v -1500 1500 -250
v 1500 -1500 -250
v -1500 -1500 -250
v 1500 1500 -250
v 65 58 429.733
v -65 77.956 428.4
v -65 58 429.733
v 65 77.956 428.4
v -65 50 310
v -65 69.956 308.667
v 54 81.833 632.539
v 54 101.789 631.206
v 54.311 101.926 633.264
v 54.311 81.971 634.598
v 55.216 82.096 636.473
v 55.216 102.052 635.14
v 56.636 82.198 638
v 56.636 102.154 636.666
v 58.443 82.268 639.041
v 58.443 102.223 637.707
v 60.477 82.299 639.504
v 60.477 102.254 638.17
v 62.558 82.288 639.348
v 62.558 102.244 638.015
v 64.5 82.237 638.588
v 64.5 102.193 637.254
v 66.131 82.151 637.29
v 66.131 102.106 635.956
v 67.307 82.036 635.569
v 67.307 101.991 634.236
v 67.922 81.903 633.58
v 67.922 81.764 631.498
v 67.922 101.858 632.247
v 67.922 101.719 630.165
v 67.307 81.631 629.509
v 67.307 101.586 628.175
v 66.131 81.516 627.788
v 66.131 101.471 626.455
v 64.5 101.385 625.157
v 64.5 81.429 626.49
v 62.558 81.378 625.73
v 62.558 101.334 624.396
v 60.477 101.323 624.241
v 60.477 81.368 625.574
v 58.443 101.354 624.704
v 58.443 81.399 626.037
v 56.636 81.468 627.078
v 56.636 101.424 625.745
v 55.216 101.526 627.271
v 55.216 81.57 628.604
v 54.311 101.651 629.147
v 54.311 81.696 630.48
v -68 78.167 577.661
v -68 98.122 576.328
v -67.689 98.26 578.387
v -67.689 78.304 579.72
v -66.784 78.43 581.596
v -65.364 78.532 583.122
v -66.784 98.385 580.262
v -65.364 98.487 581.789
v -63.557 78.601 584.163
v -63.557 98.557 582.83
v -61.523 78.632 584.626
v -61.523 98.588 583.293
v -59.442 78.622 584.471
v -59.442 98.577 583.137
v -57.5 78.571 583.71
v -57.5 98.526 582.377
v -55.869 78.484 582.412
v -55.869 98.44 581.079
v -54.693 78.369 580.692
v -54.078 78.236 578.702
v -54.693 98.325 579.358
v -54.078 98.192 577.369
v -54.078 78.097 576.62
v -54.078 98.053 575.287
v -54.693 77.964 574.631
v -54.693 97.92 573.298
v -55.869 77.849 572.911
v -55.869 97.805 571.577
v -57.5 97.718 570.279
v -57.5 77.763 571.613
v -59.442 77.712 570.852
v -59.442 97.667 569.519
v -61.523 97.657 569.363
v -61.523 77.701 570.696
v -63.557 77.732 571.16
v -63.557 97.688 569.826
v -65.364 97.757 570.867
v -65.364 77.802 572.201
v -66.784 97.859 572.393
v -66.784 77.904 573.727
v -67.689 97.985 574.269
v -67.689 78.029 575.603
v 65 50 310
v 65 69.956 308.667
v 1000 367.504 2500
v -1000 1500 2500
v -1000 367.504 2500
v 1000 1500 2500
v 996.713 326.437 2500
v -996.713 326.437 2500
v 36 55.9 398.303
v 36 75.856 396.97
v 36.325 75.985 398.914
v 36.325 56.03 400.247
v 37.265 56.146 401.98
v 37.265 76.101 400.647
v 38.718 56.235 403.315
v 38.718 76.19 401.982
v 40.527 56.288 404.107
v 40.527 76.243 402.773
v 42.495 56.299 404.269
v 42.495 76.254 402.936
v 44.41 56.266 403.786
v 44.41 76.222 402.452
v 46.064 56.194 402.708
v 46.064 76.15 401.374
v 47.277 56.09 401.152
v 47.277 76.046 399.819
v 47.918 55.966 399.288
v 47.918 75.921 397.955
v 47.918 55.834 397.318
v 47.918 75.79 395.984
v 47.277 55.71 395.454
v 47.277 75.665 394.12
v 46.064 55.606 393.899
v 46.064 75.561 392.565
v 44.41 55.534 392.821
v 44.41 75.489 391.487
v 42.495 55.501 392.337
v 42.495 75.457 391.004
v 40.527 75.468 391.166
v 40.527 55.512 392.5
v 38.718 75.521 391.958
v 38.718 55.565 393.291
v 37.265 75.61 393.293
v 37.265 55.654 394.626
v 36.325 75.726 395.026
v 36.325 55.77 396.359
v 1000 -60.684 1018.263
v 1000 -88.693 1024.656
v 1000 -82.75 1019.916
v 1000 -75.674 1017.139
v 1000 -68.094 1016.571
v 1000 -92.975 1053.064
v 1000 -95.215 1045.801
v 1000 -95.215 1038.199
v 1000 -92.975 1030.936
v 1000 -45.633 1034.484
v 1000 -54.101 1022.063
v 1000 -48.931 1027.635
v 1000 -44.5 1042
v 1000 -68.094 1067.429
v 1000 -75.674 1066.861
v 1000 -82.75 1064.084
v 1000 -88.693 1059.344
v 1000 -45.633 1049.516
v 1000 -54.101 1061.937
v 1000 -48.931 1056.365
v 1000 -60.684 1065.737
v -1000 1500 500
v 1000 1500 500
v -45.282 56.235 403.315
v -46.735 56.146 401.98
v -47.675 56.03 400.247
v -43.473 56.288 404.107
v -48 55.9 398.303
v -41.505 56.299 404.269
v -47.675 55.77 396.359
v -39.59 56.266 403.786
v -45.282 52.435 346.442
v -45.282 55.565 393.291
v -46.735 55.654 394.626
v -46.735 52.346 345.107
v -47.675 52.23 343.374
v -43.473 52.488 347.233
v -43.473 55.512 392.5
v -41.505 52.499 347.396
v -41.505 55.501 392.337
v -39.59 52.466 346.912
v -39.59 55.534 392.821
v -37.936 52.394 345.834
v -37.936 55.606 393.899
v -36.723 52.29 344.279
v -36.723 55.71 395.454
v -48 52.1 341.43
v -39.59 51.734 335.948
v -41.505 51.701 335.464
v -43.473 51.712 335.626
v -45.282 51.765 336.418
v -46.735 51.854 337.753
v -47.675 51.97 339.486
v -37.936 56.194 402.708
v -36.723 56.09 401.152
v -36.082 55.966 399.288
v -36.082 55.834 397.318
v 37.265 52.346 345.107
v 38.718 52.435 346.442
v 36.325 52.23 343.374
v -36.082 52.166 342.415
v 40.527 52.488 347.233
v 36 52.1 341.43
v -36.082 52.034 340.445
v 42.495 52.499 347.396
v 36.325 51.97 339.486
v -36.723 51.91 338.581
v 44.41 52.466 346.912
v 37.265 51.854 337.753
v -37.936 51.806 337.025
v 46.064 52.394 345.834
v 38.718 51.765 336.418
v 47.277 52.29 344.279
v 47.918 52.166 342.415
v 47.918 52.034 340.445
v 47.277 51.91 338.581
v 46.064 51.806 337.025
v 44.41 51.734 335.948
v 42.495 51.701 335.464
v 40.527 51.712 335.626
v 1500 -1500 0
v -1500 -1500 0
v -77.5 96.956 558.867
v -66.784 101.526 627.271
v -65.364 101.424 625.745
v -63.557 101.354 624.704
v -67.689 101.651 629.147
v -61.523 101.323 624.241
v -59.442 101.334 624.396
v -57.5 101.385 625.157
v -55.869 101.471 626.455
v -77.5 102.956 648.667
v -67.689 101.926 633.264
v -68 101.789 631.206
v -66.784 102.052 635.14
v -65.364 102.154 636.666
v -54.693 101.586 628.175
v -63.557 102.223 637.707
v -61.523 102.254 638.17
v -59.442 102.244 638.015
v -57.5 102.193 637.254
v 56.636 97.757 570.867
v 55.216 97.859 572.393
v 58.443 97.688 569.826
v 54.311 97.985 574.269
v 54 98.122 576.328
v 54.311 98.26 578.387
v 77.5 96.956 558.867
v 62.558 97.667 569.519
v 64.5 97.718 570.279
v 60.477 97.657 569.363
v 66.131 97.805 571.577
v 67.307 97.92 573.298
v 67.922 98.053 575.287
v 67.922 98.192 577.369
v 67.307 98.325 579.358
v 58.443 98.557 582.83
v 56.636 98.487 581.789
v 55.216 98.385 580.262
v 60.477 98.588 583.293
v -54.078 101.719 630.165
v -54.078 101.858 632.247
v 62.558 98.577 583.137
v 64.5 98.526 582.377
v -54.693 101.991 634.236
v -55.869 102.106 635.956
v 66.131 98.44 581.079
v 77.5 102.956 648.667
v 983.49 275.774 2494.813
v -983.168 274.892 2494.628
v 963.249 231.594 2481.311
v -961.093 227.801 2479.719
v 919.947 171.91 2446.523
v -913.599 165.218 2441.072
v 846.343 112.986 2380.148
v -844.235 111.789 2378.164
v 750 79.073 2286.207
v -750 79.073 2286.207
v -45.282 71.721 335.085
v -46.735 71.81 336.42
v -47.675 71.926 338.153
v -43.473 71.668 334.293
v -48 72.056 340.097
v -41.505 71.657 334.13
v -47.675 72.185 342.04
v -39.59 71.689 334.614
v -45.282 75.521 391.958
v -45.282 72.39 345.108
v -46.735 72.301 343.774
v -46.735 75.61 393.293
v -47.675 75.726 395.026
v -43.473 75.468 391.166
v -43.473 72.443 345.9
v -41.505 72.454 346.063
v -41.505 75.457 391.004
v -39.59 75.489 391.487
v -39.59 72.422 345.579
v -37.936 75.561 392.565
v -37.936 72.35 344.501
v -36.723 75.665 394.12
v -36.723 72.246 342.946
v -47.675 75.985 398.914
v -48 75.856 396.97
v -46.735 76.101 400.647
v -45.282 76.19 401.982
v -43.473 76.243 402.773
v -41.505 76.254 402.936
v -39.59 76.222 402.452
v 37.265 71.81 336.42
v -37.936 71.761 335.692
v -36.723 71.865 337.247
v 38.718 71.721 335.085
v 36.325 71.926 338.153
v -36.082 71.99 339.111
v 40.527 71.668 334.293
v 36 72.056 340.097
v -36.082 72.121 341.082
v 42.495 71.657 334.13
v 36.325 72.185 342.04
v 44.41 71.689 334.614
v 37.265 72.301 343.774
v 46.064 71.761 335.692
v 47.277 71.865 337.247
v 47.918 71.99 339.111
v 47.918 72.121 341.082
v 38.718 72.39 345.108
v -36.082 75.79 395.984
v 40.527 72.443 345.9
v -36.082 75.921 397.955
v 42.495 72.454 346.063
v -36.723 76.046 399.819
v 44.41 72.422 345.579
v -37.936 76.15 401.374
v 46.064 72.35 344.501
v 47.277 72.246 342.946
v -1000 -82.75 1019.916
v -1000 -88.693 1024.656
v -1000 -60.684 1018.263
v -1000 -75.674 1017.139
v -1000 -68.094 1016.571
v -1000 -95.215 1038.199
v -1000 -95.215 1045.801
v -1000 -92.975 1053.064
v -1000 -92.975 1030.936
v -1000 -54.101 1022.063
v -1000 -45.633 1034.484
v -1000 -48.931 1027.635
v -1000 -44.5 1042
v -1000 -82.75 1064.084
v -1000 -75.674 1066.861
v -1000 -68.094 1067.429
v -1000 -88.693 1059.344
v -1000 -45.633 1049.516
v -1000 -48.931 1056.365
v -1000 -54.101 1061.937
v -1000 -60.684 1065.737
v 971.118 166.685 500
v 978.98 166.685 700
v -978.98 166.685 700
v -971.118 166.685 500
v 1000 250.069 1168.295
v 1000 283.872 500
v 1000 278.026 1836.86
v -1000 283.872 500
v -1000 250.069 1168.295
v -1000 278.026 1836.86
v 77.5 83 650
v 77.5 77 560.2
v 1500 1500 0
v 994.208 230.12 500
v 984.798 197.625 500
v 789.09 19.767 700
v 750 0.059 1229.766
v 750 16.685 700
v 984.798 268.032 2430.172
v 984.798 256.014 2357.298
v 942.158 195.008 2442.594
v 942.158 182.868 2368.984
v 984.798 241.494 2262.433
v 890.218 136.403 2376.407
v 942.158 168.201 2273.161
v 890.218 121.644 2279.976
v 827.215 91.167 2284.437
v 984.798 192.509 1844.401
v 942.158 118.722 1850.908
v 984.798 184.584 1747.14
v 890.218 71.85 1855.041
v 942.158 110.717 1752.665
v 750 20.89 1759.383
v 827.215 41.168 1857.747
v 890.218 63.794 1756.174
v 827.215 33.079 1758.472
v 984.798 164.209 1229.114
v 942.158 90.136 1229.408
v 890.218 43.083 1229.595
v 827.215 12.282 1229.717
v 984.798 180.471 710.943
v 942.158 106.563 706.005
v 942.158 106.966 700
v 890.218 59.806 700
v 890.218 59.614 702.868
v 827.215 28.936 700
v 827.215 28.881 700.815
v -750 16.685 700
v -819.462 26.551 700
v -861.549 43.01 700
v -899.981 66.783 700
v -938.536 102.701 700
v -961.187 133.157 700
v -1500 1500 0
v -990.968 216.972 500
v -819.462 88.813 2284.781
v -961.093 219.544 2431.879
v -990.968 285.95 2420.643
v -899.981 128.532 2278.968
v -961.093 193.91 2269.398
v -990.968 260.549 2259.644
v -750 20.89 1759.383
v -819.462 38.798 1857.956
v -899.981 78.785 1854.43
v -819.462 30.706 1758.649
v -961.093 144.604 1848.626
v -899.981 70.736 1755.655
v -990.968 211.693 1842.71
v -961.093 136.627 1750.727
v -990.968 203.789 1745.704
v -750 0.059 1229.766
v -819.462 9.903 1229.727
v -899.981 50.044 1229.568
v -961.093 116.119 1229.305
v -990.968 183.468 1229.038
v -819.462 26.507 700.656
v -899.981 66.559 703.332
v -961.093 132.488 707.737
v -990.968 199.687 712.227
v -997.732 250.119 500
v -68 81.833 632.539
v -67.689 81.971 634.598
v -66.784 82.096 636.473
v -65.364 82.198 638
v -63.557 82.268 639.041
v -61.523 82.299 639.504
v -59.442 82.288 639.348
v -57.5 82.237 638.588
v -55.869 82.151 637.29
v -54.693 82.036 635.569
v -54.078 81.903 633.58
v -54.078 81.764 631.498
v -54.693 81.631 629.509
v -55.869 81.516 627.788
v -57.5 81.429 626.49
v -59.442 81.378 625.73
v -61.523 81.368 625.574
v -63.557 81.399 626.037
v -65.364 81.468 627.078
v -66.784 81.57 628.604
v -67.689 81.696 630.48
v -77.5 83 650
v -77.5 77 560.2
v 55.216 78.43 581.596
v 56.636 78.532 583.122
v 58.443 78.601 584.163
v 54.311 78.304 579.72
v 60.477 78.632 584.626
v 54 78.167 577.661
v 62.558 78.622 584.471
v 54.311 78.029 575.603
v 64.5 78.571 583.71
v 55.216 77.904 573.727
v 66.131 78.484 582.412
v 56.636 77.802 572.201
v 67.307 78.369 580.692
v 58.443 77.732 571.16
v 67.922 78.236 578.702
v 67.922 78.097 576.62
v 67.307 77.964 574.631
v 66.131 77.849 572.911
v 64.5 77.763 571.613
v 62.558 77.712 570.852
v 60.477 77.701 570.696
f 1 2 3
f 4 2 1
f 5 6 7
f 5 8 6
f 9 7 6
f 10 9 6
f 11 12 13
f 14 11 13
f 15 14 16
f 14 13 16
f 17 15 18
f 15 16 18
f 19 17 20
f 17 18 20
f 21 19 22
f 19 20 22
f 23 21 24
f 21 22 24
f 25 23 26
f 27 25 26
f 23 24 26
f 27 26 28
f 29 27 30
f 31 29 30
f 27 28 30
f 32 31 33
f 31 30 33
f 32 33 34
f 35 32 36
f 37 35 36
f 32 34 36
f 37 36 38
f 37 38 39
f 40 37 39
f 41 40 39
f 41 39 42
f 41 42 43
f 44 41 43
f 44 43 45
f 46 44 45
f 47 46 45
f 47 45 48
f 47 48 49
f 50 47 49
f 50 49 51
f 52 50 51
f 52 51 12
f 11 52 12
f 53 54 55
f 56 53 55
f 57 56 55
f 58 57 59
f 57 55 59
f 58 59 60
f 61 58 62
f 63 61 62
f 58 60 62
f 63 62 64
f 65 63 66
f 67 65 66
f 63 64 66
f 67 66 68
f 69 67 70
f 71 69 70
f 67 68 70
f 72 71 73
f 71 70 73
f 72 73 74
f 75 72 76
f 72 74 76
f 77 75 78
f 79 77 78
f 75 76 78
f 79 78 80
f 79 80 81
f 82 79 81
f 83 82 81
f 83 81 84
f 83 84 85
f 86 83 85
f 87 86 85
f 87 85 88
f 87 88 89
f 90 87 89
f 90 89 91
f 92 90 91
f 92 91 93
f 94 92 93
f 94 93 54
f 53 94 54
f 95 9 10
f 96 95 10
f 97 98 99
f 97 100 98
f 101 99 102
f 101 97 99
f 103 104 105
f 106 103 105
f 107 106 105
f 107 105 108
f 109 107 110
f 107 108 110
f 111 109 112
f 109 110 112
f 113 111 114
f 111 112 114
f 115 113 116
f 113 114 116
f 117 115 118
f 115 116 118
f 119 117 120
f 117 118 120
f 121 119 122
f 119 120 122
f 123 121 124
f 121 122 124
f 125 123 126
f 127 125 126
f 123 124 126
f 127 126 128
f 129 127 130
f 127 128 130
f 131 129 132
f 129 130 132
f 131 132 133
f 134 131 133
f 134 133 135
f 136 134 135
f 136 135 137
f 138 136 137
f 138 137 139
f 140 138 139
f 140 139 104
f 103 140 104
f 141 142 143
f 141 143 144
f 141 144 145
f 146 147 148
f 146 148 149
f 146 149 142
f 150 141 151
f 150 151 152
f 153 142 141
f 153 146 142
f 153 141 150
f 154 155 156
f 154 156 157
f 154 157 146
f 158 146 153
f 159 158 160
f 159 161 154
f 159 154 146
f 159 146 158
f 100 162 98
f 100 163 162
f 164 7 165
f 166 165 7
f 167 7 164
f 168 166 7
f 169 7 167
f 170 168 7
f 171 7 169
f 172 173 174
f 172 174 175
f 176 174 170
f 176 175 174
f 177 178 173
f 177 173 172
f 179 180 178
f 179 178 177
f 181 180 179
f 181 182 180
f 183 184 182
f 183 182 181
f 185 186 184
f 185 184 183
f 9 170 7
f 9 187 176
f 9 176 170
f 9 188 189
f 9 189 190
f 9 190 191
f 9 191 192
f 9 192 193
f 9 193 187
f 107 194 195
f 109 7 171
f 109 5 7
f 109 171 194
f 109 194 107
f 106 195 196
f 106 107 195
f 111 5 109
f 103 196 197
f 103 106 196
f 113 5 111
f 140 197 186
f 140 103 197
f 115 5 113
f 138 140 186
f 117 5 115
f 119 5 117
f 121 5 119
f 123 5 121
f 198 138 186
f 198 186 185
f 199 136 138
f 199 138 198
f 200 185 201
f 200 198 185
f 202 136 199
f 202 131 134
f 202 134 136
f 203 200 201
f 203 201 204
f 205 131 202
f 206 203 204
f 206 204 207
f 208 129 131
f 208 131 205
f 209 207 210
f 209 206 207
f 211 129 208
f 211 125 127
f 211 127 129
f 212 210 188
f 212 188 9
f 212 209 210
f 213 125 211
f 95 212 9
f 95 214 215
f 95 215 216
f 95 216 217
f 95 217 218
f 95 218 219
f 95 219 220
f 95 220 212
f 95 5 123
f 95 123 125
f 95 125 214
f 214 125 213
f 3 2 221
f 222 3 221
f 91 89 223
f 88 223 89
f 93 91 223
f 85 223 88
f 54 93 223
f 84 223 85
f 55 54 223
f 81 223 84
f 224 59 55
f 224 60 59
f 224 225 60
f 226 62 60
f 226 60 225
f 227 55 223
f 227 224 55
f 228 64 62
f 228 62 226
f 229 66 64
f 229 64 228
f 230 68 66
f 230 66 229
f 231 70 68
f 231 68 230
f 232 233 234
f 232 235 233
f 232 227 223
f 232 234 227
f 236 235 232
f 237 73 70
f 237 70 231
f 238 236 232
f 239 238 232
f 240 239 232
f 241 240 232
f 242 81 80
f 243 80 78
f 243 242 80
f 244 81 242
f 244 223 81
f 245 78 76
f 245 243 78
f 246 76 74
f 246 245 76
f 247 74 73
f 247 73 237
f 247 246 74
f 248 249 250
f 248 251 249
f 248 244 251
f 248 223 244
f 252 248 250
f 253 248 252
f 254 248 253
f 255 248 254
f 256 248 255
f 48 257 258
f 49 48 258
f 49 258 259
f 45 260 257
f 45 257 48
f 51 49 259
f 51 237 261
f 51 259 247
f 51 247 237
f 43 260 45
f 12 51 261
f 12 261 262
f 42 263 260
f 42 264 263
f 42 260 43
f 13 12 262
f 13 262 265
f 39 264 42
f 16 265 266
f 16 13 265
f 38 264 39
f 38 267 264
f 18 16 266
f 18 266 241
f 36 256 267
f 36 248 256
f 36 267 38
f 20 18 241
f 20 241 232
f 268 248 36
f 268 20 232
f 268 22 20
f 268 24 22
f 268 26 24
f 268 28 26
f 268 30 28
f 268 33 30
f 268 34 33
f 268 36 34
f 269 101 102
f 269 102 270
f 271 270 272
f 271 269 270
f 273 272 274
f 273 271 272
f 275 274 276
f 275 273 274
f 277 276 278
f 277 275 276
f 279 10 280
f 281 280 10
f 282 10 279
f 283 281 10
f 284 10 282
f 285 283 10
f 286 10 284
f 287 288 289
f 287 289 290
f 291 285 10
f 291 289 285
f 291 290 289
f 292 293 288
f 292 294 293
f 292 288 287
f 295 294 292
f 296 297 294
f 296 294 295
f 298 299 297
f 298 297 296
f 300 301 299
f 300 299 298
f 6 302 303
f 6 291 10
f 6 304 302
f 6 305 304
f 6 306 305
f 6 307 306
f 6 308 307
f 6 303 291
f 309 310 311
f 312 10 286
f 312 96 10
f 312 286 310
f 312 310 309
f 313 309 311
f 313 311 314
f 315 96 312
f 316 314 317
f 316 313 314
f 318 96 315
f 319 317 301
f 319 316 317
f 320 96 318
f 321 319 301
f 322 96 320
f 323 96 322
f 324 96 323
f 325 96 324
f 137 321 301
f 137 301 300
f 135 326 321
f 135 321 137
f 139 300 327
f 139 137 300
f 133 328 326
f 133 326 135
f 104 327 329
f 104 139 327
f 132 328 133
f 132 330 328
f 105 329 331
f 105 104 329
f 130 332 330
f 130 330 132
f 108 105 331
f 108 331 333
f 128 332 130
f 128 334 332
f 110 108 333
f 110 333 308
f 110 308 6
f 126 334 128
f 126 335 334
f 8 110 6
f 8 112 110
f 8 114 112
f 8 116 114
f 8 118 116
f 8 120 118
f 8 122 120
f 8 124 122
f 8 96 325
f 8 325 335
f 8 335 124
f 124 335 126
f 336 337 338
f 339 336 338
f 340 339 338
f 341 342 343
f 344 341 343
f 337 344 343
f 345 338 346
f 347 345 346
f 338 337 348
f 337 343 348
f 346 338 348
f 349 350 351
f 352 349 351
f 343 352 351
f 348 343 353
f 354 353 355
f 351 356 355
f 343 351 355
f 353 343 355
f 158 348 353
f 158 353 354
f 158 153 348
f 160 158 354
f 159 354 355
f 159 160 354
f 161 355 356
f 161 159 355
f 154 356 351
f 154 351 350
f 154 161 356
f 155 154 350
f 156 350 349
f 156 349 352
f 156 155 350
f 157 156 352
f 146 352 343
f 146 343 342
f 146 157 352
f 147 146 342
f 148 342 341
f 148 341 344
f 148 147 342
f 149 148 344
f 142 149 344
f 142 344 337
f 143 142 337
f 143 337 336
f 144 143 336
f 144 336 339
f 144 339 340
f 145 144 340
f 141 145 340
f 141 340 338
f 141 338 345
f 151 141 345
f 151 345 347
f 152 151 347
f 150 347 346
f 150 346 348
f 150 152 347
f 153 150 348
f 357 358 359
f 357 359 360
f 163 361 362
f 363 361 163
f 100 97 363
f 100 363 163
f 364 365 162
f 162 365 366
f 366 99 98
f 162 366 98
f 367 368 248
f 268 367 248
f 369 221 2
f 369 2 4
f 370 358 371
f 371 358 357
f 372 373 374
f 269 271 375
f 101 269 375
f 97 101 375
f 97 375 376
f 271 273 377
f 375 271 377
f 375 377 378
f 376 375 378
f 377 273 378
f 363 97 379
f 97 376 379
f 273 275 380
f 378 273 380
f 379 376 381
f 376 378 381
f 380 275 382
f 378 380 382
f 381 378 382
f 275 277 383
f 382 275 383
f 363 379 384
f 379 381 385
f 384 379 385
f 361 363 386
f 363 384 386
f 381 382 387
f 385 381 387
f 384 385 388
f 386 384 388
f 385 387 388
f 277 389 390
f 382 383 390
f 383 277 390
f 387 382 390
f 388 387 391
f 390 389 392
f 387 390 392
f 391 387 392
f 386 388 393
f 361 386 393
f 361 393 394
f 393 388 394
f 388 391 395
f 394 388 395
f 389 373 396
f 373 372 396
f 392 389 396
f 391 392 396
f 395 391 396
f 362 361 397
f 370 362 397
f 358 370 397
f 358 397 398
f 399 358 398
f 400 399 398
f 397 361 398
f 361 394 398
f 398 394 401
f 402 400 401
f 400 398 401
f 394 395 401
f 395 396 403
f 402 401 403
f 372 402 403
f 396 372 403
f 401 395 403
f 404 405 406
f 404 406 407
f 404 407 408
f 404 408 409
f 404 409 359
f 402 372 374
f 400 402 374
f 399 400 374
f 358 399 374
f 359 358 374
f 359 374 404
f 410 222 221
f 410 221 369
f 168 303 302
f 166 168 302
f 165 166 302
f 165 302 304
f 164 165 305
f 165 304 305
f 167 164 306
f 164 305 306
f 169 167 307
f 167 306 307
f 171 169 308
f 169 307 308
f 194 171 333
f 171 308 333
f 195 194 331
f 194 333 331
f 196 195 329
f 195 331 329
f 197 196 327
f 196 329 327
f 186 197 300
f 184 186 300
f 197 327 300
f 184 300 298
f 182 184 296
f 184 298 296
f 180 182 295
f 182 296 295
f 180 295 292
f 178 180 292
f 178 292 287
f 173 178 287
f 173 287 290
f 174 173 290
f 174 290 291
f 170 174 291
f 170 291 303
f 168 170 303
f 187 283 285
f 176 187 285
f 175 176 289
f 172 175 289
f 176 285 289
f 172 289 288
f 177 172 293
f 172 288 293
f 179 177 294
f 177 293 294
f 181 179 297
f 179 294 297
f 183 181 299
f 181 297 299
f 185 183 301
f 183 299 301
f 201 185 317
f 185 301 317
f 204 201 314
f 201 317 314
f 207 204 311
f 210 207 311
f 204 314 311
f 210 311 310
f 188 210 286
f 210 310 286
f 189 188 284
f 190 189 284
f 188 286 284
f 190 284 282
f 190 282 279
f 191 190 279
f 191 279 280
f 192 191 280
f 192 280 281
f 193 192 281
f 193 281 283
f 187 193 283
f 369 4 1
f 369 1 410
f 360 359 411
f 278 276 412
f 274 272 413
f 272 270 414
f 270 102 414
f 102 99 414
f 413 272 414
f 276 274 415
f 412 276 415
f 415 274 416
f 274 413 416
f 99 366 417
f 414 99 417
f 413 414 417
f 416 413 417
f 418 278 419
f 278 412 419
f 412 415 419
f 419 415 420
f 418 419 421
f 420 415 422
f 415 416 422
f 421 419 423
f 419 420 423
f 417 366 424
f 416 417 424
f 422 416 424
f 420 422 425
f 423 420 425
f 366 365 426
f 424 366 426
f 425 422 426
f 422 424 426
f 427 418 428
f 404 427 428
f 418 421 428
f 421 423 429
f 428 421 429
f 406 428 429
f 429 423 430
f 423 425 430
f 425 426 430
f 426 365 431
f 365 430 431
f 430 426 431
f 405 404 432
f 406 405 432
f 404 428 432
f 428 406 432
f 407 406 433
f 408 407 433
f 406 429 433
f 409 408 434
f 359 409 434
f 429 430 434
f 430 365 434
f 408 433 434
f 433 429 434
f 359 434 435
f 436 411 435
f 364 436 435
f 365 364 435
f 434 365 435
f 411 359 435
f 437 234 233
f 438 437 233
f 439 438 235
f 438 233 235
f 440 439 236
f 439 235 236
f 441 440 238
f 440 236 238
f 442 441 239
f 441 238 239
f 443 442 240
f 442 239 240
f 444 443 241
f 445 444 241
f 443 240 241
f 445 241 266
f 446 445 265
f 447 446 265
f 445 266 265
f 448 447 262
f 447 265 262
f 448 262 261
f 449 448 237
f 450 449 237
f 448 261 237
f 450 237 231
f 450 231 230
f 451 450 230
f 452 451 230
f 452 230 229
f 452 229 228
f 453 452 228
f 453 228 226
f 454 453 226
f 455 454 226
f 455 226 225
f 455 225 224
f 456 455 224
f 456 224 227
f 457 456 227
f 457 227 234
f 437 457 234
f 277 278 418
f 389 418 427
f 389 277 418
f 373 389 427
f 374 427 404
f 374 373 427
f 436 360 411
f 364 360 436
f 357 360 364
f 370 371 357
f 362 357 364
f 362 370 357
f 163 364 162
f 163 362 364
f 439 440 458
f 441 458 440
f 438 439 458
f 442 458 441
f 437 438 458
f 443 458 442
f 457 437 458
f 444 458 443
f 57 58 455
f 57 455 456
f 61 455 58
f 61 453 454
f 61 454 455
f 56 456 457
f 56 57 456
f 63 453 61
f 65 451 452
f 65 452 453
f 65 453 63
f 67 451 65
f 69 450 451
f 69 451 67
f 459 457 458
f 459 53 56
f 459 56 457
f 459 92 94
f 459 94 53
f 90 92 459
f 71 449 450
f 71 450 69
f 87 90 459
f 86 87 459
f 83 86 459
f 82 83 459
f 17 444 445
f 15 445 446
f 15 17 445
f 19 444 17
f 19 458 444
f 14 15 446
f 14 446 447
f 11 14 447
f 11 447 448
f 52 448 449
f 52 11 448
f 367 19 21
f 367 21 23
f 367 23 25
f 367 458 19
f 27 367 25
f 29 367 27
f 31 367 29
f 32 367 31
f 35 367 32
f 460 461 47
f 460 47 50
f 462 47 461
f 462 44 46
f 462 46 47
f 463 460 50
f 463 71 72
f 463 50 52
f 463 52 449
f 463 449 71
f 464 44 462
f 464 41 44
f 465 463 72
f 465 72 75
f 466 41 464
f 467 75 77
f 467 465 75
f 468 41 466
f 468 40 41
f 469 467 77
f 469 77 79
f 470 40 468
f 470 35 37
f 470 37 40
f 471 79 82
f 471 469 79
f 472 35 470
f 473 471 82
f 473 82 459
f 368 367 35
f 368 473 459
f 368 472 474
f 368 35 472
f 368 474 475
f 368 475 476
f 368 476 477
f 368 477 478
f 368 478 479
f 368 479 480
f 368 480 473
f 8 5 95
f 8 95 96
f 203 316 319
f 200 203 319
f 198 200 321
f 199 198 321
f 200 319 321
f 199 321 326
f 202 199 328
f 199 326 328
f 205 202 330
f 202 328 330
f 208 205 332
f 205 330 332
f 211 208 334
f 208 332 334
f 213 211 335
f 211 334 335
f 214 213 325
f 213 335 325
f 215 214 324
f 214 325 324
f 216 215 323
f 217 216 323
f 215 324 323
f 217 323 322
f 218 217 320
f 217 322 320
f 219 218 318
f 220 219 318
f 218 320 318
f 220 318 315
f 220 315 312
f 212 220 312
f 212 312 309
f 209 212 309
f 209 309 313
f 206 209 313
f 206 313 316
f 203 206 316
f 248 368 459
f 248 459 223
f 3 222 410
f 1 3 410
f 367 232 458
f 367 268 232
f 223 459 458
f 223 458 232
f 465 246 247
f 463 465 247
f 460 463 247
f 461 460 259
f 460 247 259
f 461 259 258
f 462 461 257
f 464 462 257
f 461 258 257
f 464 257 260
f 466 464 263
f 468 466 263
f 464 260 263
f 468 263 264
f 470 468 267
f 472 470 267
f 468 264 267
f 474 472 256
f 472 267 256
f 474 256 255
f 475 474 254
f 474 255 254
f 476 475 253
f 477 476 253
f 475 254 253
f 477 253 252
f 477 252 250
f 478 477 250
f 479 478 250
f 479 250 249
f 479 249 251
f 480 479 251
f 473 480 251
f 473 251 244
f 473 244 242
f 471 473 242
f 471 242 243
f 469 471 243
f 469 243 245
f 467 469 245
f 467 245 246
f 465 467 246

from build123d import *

# Parameters (mm, degrees)
F0_W          = 3000
F0_H          = 250
F1_DEPTH      = 1500
F1_DEPTH_BACK = 1500
F3_DEPTH      = 65
F3_DEPTH_BACK = 65
F5_DEPTH      = 77.5
F5_DEPTH_BACK = 77.5
F6_R          = 25.5
F7_DEPTH      = 1000
F7_DEPTH_BACK = 1000
F8_R          = 250
F10_D         = 14
F12_D         = 12


with BuildPart() as f1:
    # F0 (on Right) → F1 (new body, two sides)
    with BuildSketch(Plane.YZ) as f1_sk:
        with Locations((0, -125)):
            Rectangle(F0_W, F0_H)
    extrude(amount=F1_DEPTH)
    extrude(f1_sk.sketch, amount=-F1_DEPTH_BACK)


with BuildPart() as f3:
    # F2 (on Right) → F3 (new body, two sides)
    with BuildSketch(Plane.YZ) as f3_sk:
        Polygon((58, 429.7330363768), (50, 310), (69.9555060628, 308.6666666667), (77.9555060628, 428.3997030434), align=None)
    extrude(amount=F3_DEPTH)
    extrude(f3_sk.sketch, amount=-F3_DEPTH_BACK)

    # F12 (through all)
    with Locations(Plane(origin=(0, 29.1570881796, -1.9481398994), x_dir=(1, 0, 0), z_dir=(0, -0.9977753031, 0.0666666667))):
        with Locations((-42, 401.1436773066), (42, 344.1436773066), (-42, 344.1436773066), (42, 401.1436773066)):
            Hole(F12_D / 2)


with BuildPart() as f5:
    # F4 (on Right) → F5 (new body, two sides)
    with BuildSketch(Plane.YZ) as f5_sk:
        Polygon((83, 650), (77, 560.2002227174), (96.9555060628, 558.8668893841), (102.9555060628, 648.6666666667), align=None)
    extrude(amount=F5_DEPTH)
    extrude(f5_sk.sketch, amount=-F5_DEPTH_BACK)

    # F10 (through all)
    with Locations(Plane(origin=(0, 39.3941813084, -2.6321344552), x_dir=(1, 0, 0), z_dir=(0, -0.9977753031, 0.0666666667))):
        with Locations((-61, 636.5872803741), (61, 636.5872803741), (61, 581.5872803741), (-61, 581.5872803741)):
            Hole(F10_D / 2)


with BuildPart() as f7:
    # F6 (on Right) → F7 (new body, two sides)
    with BuildSketch(Plane.YZ) as f7_sk:
        with Locations((-70, 1042)):
            Circle(F6_R)
    extrude(amount=F7_DEPTH)
    extrude(f7_sk.sketch, amount=-F7_DEPTH_BACK)


with BuildPart() as f7b:
    # F6 (on Right) → F7, piece 2 (new body, two sides)
    with BuildSketch(Plane.YZ) as f7_2_sk:
        with BuildLine():
            Line((1500, 2500), (113.5258749522, 2500))
            ThreePointArc((113.5258749522, 2500), (10.8307889193, 1602.9200017379), (16.6852264521, 700))
            Line((16.6852264521, 700), (166.6852264521, 700))
            Line((166.6852264521, 700), (166.6852264521, 500))
            Line((166.6852264521, 500), (1500, 500))
            Line((1500, 500), (1500, 2500))
        make_face()
    extrude(amount=F7_DEPTH)
    extrude(f7_2_sk.sketch, amount=-F7_DEPTH_BACK)

    # F8
    f8_edges = [f7b.edges().sort_by_distance(p)[0] for p in [
        (-1000, 10.830789, 1602.920002),
        (1000, 10.830789, 1602.920002),
        (0, 113.525875, 2500),
    ]]
    fillet(f8_edges, radius=F8_R)


solid = Compound([f1.part, f3.part, f5.part, f7.part, f7b.part])
